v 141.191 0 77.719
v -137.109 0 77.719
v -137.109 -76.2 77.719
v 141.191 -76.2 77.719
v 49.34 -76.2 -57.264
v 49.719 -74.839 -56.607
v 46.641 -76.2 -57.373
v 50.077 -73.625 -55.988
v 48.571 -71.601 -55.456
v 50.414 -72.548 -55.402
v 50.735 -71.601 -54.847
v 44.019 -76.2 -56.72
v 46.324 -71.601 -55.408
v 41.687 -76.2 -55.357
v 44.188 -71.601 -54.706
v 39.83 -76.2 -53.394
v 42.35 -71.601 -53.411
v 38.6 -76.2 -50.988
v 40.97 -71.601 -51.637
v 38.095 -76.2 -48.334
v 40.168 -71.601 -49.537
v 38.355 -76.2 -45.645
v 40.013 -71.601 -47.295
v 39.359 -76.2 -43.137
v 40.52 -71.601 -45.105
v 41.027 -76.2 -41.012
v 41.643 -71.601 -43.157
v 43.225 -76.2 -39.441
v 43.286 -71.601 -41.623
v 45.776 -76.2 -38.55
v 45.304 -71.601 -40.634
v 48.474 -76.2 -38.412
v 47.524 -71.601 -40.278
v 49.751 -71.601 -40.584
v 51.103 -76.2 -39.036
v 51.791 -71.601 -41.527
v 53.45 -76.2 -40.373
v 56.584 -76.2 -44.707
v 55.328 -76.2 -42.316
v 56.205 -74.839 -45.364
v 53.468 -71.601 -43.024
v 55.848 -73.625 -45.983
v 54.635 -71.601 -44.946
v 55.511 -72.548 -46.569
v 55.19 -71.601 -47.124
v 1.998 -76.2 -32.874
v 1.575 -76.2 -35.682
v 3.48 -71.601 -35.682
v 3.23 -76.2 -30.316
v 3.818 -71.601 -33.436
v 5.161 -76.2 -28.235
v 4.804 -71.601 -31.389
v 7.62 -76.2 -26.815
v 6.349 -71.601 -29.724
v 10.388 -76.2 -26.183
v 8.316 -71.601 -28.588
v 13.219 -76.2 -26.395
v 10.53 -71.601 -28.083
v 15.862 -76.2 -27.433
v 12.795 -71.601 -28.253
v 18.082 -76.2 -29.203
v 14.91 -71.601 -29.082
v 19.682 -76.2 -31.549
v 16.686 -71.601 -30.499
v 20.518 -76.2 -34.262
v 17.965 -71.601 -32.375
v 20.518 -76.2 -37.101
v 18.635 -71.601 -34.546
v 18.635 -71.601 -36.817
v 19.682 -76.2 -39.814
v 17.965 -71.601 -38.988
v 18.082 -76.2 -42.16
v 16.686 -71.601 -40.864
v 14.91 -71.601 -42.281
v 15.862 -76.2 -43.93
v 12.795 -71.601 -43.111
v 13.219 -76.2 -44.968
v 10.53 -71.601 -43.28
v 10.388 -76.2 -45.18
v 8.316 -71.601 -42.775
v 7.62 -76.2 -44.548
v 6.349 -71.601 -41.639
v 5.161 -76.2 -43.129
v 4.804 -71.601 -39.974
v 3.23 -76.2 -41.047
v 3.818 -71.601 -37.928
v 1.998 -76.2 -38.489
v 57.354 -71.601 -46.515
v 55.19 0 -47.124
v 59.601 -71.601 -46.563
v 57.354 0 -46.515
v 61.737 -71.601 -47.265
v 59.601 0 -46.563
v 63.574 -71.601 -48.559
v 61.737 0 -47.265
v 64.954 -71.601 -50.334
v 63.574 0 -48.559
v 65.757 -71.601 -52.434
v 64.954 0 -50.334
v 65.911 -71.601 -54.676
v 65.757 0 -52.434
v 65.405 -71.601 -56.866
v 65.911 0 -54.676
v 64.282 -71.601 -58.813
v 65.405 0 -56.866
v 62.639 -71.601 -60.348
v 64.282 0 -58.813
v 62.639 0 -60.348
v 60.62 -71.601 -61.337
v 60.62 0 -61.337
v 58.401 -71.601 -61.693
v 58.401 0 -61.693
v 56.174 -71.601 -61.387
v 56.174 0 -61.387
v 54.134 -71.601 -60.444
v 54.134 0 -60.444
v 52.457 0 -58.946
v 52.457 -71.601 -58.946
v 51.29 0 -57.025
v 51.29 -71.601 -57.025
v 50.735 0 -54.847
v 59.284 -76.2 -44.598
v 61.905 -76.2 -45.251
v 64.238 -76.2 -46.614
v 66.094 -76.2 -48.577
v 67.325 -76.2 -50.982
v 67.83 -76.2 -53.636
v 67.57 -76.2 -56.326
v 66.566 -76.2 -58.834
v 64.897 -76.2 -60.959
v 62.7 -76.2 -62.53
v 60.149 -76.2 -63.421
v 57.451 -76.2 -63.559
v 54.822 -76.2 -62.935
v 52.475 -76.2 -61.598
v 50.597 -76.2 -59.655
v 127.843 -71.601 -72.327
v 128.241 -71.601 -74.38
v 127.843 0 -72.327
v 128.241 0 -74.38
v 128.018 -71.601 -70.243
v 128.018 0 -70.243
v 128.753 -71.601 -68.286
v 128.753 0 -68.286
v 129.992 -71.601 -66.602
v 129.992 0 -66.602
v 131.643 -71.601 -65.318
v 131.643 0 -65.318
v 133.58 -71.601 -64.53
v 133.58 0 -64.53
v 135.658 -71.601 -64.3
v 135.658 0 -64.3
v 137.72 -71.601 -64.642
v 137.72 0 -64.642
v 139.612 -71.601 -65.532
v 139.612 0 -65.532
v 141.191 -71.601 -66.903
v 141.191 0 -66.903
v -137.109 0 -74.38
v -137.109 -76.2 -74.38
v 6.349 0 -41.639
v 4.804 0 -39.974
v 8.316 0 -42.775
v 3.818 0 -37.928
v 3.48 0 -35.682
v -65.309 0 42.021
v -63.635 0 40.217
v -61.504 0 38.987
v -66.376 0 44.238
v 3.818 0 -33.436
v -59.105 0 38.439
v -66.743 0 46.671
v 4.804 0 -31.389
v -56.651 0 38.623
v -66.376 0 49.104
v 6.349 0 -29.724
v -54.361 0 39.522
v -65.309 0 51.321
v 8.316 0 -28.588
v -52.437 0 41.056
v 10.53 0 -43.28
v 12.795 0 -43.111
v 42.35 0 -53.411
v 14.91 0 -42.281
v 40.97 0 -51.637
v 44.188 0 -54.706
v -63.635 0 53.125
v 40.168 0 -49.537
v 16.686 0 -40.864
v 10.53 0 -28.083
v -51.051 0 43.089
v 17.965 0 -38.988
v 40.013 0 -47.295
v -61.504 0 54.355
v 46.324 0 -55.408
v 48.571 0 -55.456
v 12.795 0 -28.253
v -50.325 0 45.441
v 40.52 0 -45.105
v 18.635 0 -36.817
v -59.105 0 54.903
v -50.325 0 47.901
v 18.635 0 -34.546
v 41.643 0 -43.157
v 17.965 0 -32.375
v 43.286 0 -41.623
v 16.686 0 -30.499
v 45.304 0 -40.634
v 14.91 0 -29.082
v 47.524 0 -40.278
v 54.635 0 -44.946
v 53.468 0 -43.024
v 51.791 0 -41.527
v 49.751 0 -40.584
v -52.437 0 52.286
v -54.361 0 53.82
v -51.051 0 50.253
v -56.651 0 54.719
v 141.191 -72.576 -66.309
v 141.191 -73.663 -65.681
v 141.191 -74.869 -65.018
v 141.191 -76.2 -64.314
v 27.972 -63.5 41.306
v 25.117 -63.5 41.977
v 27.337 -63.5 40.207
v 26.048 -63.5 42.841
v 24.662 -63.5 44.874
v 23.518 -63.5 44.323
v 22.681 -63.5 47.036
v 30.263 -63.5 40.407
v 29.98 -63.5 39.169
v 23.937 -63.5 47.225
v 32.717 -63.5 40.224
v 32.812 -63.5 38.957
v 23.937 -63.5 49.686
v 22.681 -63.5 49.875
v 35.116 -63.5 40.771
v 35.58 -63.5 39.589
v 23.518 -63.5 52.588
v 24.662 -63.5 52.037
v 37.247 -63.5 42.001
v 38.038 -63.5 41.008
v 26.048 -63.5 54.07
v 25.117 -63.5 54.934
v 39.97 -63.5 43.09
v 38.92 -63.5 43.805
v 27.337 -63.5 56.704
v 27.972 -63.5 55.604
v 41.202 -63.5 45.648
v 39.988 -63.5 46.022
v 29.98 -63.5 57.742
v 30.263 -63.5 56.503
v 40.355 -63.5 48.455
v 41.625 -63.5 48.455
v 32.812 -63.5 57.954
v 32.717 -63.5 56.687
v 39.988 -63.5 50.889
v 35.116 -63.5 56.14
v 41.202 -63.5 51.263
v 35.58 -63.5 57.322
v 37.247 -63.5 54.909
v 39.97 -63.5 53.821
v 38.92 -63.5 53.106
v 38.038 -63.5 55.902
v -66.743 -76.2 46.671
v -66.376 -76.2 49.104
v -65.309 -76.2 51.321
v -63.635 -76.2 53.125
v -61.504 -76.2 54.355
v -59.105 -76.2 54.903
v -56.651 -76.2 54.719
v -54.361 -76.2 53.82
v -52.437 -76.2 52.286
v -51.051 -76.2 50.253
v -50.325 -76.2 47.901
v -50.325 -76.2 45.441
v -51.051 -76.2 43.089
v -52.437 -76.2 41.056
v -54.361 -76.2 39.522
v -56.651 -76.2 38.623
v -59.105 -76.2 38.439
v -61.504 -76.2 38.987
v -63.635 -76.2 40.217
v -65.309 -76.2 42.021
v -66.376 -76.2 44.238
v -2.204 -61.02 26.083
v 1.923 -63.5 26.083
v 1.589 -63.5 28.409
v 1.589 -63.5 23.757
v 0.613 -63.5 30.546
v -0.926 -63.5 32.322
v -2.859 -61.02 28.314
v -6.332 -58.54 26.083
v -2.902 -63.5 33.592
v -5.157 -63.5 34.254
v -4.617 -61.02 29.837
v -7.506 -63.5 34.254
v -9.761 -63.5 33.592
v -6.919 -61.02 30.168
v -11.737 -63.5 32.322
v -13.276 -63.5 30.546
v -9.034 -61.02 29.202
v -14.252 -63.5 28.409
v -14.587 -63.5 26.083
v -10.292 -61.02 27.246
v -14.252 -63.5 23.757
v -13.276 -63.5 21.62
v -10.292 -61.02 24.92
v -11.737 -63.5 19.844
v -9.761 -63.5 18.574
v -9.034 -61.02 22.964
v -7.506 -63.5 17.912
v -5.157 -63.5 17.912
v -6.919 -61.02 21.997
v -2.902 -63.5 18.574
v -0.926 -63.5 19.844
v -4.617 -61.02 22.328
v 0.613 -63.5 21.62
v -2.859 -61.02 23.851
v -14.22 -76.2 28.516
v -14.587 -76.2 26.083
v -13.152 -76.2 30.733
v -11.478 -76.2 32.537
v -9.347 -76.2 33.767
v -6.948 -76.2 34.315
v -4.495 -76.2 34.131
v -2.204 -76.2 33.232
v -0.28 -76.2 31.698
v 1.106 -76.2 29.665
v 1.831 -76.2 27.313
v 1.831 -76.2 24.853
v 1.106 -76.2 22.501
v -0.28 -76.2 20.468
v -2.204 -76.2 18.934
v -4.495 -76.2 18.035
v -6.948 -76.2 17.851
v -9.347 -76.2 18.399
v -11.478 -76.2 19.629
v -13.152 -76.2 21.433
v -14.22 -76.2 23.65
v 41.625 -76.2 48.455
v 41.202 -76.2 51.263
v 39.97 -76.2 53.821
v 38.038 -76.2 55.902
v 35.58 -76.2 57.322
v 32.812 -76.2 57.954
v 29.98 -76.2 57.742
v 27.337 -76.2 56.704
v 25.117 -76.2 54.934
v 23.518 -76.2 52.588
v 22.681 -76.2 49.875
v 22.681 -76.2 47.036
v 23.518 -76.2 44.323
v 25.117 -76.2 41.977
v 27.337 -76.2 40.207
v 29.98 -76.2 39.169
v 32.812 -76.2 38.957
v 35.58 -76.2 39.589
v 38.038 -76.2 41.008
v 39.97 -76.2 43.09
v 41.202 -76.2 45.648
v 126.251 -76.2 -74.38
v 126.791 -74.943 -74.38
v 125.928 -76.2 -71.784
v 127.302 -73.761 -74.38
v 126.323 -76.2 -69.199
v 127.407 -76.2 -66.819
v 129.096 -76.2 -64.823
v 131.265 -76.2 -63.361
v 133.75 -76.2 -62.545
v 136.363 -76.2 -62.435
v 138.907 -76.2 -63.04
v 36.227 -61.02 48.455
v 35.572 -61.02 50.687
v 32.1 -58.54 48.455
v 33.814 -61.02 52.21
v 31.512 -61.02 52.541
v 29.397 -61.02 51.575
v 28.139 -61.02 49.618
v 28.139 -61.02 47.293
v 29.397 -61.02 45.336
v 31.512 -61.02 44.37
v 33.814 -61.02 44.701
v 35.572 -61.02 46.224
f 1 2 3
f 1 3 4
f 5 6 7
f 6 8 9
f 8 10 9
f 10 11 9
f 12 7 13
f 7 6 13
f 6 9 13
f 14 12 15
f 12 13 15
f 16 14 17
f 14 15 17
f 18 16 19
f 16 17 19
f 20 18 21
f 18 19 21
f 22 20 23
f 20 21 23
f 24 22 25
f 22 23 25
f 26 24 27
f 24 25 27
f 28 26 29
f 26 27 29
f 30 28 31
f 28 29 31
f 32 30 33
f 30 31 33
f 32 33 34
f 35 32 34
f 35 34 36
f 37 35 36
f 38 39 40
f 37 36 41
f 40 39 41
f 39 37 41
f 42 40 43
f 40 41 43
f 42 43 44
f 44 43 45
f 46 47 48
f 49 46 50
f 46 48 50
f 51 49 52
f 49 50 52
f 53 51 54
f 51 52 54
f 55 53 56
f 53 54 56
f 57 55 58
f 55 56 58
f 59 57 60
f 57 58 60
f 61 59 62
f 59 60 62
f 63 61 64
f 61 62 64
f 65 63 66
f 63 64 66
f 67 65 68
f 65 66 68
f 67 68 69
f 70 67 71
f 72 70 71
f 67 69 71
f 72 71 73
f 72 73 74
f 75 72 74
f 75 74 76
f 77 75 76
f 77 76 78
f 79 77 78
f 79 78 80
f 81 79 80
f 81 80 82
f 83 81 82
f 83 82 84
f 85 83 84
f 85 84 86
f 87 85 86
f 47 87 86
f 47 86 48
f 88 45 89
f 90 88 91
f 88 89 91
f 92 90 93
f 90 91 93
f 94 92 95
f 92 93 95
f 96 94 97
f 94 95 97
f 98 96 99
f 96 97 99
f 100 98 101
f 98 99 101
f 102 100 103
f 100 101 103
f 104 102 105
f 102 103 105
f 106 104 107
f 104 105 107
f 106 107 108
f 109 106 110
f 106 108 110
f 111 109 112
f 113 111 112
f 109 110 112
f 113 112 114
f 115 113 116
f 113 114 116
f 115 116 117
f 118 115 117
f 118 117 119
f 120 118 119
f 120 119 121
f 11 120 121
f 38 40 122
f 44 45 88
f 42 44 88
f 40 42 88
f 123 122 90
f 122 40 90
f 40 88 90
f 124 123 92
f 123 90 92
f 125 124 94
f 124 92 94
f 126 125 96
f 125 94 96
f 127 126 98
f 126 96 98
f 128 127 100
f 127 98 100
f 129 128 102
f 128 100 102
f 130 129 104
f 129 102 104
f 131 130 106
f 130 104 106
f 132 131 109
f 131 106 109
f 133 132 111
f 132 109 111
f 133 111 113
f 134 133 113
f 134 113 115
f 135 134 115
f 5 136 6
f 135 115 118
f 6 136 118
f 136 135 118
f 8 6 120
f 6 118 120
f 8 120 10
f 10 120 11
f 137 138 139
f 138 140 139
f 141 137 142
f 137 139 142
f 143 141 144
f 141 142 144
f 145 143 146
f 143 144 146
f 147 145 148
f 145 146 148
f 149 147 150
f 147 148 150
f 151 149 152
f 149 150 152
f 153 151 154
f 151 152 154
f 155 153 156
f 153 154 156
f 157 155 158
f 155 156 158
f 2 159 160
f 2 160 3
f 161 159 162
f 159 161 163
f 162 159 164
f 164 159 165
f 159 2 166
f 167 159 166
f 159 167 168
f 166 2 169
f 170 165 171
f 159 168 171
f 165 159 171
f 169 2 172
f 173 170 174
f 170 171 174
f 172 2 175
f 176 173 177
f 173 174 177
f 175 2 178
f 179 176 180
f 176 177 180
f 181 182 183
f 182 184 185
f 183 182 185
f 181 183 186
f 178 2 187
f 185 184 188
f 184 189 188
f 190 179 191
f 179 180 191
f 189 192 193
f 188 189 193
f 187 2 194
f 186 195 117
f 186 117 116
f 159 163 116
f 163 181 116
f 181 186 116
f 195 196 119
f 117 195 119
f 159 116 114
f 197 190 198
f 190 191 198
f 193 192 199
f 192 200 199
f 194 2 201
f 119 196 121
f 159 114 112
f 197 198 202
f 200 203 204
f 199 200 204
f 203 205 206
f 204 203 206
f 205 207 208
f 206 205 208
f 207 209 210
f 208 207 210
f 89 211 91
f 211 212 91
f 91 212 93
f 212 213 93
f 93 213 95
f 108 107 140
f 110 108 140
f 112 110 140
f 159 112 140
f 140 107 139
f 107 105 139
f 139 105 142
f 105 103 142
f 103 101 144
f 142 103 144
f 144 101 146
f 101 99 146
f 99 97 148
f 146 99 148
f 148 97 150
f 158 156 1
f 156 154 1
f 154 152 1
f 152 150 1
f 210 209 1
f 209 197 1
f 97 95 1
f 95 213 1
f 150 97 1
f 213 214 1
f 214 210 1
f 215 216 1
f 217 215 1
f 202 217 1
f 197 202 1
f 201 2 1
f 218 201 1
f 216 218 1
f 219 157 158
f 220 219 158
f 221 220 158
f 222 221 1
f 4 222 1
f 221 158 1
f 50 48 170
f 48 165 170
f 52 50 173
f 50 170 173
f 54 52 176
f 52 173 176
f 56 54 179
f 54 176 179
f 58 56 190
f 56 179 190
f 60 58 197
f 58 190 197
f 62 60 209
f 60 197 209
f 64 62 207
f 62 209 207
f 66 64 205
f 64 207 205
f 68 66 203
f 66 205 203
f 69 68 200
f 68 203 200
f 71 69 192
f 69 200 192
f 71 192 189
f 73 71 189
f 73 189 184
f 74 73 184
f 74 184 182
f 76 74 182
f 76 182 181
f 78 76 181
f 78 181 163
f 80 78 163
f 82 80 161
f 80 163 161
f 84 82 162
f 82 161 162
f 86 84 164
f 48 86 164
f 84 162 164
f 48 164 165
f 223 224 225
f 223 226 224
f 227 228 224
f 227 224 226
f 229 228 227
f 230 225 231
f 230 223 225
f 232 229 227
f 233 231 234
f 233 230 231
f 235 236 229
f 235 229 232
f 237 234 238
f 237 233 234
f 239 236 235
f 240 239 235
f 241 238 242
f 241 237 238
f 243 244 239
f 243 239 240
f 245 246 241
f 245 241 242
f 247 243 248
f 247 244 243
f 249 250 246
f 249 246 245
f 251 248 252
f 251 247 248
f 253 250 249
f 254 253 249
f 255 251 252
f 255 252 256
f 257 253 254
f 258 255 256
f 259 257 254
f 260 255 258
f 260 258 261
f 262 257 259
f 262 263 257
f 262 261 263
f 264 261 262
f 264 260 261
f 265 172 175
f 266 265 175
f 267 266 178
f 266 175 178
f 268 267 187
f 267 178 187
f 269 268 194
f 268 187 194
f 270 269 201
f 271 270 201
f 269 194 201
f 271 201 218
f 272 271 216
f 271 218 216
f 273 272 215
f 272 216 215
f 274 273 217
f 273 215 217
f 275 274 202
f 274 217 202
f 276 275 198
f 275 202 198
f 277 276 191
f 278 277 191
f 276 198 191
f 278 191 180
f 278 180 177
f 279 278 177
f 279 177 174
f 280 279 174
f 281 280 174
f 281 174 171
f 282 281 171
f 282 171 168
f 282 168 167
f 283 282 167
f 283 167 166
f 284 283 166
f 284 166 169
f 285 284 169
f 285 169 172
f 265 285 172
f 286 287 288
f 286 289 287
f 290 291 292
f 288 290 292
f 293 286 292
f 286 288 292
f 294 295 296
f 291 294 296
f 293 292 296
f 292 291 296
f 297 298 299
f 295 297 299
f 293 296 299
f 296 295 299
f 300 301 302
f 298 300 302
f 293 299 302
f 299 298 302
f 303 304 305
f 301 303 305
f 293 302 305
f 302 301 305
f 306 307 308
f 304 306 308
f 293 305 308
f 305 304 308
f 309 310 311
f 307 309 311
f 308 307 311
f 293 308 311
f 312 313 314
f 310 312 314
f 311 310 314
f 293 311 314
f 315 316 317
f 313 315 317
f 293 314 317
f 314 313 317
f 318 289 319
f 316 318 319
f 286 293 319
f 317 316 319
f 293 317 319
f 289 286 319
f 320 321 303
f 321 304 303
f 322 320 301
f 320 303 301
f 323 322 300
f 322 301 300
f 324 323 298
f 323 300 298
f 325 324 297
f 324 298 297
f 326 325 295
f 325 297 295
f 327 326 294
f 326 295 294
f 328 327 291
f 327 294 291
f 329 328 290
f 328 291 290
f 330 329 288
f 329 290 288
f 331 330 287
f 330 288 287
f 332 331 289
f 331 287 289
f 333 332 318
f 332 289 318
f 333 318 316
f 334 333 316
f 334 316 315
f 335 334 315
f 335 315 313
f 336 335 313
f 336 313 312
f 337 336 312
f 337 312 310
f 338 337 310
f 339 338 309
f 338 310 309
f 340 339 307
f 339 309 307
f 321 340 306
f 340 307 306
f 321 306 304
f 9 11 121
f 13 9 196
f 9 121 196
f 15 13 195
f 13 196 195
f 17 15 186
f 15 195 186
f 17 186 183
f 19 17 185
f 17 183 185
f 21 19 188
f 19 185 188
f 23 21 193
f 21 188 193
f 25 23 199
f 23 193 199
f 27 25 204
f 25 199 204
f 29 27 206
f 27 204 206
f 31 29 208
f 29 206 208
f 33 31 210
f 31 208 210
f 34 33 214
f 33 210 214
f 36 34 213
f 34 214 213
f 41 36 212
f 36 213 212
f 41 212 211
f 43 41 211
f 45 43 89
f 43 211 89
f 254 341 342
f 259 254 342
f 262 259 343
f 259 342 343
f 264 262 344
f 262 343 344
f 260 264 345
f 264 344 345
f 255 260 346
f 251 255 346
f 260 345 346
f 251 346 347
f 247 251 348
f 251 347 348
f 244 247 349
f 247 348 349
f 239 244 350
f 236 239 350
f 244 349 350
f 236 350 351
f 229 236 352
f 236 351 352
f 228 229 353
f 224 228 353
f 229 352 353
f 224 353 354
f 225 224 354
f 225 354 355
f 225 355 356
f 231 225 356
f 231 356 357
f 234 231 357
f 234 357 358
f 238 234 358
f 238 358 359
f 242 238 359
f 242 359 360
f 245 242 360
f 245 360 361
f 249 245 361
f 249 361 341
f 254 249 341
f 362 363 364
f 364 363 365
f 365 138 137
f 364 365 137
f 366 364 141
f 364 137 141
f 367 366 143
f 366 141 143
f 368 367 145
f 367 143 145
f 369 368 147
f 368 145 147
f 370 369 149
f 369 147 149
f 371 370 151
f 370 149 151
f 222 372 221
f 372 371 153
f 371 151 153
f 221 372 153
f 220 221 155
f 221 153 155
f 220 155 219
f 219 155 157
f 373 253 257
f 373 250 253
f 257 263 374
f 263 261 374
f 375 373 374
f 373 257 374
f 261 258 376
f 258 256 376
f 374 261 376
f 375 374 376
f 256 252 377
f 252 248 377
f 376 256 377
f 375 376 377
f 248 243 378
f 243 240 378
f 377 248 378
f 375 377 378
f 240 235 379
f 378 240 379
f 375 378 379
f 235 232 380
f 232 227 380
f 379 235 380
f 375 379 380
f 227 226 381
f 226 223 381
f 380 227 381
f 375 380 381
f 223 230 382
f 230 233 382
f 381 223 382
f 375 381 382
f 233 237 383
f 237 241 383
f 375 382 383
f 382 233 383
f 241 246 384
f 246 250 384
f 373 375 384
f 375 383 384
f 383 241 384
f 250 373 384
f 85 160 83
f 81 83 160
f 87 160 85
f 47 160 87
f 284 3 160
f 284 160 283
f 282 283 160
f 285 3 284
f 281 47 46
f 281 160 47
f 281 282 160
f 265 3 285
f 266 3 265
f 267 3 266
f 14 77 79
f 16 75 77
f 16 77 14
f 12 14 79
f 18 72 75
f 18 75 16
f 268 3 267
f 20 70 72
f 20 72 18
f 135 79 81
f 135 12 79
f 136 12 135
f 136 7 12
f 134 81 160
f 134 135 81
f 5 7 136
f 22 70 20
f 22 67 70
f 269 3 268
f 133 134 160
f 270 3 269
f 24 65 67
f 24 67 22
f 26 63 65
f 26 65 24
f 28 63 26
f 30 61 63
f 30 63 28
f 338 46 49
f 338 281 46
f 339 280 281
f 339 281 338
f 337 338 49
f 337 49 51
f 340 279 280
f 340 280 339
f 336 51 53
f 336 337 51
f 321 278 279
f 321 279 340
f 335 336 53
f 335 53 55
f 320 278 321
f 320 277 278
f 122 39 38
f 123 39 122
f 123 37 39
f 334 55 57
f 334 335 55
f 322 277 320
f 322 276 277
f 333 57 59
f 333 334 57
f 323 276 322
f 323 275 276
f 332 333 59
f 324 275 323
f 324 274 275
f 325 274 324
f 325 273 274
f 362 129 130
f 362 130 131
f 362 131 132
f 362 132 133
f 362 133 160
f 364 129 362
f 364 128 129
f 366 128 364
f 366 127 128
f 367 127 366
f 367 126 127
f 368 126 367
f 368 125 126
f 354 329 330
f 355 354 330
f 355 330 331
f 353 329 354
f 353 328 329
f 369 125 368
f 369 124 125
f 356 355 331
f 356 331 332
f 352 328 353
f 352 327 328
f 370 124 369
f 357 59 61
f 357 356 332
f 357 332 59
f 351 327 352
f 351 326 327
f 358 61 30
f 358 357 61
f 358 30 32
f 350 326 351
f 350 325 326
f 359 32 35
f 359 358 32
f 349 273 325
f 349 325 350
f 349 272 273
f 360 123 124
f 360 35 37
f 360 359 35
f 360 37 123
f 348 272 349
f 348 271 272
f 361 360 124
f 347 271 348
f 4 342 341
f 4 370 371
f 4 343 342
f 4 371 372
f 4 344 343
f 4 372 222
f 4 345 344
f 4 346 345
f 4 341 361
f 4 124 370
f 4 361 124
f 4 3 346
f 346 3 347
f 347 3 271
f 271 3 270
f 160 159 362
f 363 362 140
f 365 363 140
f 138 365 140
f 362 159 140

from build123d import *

# Parameters (mm, degrees)
F0_W           = 278.2998234034
F0_H           = 152.0985364914
F1_DEPTH       = 76.2
F3_D           = 16.51
F4_D           = 16.51
F4_DEPTH       = 12.7
F4_TIP         = 4.9601044101
F5_D           = 16.51
F5_DEPTH       = 12.7
F5_CBORE_D     = 19.05
F5_CBORE_DEPTH = 12.7
F5_TIP         = 4.9601044101
F6_D           = 15.24
F6_CSINK_D     = 19.05
F6_CSINK_ANGLE = 45
F7_D           = 15.24
F7_CSINK_D     = 19.05
F7_CSINK_ANGLE = 45


with BuildPart() as f1:
    # F0 (on Front) → F1 (new body)
    with BuildSketch(Plane.XZ):
        with Locations((2.0410194993, 1.6697347164)):
            Rectangle(F0_W, F0_H)
    extrude(amount=F1_DEPTH)

    # F3 (through all)
    with Locations(Plane.XZ.offset(76.2)):
        with Locations((-58.4882125258, 46.6711297631)):
            Hole(F3_D / 2)

    # F4
    with Locations(Plane.XZ.offset(76.2)):
        with Locations((-6.3315038569, 26.0829553008)):
            Hole(F4_D / 2, depth=F4_DEPTH)
            with Locations((0, 0, -(F4_DEPTH + F4_TIP / 2))):  # 118° drill point
                Cone(0, F4_D / 2, F4_TIP, mode=Mode.SUBTRACT)

    # F5
    with Locations(Plane.XZ.offset(76.2)):
        with Locations((32.0997536182, 48.455439508)):
            CounterBoreHole(F5_D / 2, F5_CBORE_D / 2, F5_CBORE_DEPTH, depth=F5_DEPTH)
            with Locations((0, 0, -(F5_DEPTH + F5_TIP / 2))):  # 118° drill point
                Cone(0, F5_D / 2, F5_TIP, mode=Mode.SUBTRACT)

    # F6 (through all)
    with Locations(Plane.XZ.offset(76.2)):
        with Locations((11.0998153687, -35.6815680861)):
            CounterSinkHole(F6_D / 2, F6_CSINK_D / 2, counter_sink_angle=F6_CSINK_ANGLE)

    # F7 (through all)
    with Locations(Plane.XZ.offset(76.2)):
        with Locations((135.4523897171, -71.9167515635), (47.6095117629, -47.8972196579), (58.315359056, -54.0736690164)):
            CounterSinkHole(F7_D / 2, F7_CSINK_D / 2, counter_sink_angle=F7_CSINK_ANGLE)


solid = f1.part
